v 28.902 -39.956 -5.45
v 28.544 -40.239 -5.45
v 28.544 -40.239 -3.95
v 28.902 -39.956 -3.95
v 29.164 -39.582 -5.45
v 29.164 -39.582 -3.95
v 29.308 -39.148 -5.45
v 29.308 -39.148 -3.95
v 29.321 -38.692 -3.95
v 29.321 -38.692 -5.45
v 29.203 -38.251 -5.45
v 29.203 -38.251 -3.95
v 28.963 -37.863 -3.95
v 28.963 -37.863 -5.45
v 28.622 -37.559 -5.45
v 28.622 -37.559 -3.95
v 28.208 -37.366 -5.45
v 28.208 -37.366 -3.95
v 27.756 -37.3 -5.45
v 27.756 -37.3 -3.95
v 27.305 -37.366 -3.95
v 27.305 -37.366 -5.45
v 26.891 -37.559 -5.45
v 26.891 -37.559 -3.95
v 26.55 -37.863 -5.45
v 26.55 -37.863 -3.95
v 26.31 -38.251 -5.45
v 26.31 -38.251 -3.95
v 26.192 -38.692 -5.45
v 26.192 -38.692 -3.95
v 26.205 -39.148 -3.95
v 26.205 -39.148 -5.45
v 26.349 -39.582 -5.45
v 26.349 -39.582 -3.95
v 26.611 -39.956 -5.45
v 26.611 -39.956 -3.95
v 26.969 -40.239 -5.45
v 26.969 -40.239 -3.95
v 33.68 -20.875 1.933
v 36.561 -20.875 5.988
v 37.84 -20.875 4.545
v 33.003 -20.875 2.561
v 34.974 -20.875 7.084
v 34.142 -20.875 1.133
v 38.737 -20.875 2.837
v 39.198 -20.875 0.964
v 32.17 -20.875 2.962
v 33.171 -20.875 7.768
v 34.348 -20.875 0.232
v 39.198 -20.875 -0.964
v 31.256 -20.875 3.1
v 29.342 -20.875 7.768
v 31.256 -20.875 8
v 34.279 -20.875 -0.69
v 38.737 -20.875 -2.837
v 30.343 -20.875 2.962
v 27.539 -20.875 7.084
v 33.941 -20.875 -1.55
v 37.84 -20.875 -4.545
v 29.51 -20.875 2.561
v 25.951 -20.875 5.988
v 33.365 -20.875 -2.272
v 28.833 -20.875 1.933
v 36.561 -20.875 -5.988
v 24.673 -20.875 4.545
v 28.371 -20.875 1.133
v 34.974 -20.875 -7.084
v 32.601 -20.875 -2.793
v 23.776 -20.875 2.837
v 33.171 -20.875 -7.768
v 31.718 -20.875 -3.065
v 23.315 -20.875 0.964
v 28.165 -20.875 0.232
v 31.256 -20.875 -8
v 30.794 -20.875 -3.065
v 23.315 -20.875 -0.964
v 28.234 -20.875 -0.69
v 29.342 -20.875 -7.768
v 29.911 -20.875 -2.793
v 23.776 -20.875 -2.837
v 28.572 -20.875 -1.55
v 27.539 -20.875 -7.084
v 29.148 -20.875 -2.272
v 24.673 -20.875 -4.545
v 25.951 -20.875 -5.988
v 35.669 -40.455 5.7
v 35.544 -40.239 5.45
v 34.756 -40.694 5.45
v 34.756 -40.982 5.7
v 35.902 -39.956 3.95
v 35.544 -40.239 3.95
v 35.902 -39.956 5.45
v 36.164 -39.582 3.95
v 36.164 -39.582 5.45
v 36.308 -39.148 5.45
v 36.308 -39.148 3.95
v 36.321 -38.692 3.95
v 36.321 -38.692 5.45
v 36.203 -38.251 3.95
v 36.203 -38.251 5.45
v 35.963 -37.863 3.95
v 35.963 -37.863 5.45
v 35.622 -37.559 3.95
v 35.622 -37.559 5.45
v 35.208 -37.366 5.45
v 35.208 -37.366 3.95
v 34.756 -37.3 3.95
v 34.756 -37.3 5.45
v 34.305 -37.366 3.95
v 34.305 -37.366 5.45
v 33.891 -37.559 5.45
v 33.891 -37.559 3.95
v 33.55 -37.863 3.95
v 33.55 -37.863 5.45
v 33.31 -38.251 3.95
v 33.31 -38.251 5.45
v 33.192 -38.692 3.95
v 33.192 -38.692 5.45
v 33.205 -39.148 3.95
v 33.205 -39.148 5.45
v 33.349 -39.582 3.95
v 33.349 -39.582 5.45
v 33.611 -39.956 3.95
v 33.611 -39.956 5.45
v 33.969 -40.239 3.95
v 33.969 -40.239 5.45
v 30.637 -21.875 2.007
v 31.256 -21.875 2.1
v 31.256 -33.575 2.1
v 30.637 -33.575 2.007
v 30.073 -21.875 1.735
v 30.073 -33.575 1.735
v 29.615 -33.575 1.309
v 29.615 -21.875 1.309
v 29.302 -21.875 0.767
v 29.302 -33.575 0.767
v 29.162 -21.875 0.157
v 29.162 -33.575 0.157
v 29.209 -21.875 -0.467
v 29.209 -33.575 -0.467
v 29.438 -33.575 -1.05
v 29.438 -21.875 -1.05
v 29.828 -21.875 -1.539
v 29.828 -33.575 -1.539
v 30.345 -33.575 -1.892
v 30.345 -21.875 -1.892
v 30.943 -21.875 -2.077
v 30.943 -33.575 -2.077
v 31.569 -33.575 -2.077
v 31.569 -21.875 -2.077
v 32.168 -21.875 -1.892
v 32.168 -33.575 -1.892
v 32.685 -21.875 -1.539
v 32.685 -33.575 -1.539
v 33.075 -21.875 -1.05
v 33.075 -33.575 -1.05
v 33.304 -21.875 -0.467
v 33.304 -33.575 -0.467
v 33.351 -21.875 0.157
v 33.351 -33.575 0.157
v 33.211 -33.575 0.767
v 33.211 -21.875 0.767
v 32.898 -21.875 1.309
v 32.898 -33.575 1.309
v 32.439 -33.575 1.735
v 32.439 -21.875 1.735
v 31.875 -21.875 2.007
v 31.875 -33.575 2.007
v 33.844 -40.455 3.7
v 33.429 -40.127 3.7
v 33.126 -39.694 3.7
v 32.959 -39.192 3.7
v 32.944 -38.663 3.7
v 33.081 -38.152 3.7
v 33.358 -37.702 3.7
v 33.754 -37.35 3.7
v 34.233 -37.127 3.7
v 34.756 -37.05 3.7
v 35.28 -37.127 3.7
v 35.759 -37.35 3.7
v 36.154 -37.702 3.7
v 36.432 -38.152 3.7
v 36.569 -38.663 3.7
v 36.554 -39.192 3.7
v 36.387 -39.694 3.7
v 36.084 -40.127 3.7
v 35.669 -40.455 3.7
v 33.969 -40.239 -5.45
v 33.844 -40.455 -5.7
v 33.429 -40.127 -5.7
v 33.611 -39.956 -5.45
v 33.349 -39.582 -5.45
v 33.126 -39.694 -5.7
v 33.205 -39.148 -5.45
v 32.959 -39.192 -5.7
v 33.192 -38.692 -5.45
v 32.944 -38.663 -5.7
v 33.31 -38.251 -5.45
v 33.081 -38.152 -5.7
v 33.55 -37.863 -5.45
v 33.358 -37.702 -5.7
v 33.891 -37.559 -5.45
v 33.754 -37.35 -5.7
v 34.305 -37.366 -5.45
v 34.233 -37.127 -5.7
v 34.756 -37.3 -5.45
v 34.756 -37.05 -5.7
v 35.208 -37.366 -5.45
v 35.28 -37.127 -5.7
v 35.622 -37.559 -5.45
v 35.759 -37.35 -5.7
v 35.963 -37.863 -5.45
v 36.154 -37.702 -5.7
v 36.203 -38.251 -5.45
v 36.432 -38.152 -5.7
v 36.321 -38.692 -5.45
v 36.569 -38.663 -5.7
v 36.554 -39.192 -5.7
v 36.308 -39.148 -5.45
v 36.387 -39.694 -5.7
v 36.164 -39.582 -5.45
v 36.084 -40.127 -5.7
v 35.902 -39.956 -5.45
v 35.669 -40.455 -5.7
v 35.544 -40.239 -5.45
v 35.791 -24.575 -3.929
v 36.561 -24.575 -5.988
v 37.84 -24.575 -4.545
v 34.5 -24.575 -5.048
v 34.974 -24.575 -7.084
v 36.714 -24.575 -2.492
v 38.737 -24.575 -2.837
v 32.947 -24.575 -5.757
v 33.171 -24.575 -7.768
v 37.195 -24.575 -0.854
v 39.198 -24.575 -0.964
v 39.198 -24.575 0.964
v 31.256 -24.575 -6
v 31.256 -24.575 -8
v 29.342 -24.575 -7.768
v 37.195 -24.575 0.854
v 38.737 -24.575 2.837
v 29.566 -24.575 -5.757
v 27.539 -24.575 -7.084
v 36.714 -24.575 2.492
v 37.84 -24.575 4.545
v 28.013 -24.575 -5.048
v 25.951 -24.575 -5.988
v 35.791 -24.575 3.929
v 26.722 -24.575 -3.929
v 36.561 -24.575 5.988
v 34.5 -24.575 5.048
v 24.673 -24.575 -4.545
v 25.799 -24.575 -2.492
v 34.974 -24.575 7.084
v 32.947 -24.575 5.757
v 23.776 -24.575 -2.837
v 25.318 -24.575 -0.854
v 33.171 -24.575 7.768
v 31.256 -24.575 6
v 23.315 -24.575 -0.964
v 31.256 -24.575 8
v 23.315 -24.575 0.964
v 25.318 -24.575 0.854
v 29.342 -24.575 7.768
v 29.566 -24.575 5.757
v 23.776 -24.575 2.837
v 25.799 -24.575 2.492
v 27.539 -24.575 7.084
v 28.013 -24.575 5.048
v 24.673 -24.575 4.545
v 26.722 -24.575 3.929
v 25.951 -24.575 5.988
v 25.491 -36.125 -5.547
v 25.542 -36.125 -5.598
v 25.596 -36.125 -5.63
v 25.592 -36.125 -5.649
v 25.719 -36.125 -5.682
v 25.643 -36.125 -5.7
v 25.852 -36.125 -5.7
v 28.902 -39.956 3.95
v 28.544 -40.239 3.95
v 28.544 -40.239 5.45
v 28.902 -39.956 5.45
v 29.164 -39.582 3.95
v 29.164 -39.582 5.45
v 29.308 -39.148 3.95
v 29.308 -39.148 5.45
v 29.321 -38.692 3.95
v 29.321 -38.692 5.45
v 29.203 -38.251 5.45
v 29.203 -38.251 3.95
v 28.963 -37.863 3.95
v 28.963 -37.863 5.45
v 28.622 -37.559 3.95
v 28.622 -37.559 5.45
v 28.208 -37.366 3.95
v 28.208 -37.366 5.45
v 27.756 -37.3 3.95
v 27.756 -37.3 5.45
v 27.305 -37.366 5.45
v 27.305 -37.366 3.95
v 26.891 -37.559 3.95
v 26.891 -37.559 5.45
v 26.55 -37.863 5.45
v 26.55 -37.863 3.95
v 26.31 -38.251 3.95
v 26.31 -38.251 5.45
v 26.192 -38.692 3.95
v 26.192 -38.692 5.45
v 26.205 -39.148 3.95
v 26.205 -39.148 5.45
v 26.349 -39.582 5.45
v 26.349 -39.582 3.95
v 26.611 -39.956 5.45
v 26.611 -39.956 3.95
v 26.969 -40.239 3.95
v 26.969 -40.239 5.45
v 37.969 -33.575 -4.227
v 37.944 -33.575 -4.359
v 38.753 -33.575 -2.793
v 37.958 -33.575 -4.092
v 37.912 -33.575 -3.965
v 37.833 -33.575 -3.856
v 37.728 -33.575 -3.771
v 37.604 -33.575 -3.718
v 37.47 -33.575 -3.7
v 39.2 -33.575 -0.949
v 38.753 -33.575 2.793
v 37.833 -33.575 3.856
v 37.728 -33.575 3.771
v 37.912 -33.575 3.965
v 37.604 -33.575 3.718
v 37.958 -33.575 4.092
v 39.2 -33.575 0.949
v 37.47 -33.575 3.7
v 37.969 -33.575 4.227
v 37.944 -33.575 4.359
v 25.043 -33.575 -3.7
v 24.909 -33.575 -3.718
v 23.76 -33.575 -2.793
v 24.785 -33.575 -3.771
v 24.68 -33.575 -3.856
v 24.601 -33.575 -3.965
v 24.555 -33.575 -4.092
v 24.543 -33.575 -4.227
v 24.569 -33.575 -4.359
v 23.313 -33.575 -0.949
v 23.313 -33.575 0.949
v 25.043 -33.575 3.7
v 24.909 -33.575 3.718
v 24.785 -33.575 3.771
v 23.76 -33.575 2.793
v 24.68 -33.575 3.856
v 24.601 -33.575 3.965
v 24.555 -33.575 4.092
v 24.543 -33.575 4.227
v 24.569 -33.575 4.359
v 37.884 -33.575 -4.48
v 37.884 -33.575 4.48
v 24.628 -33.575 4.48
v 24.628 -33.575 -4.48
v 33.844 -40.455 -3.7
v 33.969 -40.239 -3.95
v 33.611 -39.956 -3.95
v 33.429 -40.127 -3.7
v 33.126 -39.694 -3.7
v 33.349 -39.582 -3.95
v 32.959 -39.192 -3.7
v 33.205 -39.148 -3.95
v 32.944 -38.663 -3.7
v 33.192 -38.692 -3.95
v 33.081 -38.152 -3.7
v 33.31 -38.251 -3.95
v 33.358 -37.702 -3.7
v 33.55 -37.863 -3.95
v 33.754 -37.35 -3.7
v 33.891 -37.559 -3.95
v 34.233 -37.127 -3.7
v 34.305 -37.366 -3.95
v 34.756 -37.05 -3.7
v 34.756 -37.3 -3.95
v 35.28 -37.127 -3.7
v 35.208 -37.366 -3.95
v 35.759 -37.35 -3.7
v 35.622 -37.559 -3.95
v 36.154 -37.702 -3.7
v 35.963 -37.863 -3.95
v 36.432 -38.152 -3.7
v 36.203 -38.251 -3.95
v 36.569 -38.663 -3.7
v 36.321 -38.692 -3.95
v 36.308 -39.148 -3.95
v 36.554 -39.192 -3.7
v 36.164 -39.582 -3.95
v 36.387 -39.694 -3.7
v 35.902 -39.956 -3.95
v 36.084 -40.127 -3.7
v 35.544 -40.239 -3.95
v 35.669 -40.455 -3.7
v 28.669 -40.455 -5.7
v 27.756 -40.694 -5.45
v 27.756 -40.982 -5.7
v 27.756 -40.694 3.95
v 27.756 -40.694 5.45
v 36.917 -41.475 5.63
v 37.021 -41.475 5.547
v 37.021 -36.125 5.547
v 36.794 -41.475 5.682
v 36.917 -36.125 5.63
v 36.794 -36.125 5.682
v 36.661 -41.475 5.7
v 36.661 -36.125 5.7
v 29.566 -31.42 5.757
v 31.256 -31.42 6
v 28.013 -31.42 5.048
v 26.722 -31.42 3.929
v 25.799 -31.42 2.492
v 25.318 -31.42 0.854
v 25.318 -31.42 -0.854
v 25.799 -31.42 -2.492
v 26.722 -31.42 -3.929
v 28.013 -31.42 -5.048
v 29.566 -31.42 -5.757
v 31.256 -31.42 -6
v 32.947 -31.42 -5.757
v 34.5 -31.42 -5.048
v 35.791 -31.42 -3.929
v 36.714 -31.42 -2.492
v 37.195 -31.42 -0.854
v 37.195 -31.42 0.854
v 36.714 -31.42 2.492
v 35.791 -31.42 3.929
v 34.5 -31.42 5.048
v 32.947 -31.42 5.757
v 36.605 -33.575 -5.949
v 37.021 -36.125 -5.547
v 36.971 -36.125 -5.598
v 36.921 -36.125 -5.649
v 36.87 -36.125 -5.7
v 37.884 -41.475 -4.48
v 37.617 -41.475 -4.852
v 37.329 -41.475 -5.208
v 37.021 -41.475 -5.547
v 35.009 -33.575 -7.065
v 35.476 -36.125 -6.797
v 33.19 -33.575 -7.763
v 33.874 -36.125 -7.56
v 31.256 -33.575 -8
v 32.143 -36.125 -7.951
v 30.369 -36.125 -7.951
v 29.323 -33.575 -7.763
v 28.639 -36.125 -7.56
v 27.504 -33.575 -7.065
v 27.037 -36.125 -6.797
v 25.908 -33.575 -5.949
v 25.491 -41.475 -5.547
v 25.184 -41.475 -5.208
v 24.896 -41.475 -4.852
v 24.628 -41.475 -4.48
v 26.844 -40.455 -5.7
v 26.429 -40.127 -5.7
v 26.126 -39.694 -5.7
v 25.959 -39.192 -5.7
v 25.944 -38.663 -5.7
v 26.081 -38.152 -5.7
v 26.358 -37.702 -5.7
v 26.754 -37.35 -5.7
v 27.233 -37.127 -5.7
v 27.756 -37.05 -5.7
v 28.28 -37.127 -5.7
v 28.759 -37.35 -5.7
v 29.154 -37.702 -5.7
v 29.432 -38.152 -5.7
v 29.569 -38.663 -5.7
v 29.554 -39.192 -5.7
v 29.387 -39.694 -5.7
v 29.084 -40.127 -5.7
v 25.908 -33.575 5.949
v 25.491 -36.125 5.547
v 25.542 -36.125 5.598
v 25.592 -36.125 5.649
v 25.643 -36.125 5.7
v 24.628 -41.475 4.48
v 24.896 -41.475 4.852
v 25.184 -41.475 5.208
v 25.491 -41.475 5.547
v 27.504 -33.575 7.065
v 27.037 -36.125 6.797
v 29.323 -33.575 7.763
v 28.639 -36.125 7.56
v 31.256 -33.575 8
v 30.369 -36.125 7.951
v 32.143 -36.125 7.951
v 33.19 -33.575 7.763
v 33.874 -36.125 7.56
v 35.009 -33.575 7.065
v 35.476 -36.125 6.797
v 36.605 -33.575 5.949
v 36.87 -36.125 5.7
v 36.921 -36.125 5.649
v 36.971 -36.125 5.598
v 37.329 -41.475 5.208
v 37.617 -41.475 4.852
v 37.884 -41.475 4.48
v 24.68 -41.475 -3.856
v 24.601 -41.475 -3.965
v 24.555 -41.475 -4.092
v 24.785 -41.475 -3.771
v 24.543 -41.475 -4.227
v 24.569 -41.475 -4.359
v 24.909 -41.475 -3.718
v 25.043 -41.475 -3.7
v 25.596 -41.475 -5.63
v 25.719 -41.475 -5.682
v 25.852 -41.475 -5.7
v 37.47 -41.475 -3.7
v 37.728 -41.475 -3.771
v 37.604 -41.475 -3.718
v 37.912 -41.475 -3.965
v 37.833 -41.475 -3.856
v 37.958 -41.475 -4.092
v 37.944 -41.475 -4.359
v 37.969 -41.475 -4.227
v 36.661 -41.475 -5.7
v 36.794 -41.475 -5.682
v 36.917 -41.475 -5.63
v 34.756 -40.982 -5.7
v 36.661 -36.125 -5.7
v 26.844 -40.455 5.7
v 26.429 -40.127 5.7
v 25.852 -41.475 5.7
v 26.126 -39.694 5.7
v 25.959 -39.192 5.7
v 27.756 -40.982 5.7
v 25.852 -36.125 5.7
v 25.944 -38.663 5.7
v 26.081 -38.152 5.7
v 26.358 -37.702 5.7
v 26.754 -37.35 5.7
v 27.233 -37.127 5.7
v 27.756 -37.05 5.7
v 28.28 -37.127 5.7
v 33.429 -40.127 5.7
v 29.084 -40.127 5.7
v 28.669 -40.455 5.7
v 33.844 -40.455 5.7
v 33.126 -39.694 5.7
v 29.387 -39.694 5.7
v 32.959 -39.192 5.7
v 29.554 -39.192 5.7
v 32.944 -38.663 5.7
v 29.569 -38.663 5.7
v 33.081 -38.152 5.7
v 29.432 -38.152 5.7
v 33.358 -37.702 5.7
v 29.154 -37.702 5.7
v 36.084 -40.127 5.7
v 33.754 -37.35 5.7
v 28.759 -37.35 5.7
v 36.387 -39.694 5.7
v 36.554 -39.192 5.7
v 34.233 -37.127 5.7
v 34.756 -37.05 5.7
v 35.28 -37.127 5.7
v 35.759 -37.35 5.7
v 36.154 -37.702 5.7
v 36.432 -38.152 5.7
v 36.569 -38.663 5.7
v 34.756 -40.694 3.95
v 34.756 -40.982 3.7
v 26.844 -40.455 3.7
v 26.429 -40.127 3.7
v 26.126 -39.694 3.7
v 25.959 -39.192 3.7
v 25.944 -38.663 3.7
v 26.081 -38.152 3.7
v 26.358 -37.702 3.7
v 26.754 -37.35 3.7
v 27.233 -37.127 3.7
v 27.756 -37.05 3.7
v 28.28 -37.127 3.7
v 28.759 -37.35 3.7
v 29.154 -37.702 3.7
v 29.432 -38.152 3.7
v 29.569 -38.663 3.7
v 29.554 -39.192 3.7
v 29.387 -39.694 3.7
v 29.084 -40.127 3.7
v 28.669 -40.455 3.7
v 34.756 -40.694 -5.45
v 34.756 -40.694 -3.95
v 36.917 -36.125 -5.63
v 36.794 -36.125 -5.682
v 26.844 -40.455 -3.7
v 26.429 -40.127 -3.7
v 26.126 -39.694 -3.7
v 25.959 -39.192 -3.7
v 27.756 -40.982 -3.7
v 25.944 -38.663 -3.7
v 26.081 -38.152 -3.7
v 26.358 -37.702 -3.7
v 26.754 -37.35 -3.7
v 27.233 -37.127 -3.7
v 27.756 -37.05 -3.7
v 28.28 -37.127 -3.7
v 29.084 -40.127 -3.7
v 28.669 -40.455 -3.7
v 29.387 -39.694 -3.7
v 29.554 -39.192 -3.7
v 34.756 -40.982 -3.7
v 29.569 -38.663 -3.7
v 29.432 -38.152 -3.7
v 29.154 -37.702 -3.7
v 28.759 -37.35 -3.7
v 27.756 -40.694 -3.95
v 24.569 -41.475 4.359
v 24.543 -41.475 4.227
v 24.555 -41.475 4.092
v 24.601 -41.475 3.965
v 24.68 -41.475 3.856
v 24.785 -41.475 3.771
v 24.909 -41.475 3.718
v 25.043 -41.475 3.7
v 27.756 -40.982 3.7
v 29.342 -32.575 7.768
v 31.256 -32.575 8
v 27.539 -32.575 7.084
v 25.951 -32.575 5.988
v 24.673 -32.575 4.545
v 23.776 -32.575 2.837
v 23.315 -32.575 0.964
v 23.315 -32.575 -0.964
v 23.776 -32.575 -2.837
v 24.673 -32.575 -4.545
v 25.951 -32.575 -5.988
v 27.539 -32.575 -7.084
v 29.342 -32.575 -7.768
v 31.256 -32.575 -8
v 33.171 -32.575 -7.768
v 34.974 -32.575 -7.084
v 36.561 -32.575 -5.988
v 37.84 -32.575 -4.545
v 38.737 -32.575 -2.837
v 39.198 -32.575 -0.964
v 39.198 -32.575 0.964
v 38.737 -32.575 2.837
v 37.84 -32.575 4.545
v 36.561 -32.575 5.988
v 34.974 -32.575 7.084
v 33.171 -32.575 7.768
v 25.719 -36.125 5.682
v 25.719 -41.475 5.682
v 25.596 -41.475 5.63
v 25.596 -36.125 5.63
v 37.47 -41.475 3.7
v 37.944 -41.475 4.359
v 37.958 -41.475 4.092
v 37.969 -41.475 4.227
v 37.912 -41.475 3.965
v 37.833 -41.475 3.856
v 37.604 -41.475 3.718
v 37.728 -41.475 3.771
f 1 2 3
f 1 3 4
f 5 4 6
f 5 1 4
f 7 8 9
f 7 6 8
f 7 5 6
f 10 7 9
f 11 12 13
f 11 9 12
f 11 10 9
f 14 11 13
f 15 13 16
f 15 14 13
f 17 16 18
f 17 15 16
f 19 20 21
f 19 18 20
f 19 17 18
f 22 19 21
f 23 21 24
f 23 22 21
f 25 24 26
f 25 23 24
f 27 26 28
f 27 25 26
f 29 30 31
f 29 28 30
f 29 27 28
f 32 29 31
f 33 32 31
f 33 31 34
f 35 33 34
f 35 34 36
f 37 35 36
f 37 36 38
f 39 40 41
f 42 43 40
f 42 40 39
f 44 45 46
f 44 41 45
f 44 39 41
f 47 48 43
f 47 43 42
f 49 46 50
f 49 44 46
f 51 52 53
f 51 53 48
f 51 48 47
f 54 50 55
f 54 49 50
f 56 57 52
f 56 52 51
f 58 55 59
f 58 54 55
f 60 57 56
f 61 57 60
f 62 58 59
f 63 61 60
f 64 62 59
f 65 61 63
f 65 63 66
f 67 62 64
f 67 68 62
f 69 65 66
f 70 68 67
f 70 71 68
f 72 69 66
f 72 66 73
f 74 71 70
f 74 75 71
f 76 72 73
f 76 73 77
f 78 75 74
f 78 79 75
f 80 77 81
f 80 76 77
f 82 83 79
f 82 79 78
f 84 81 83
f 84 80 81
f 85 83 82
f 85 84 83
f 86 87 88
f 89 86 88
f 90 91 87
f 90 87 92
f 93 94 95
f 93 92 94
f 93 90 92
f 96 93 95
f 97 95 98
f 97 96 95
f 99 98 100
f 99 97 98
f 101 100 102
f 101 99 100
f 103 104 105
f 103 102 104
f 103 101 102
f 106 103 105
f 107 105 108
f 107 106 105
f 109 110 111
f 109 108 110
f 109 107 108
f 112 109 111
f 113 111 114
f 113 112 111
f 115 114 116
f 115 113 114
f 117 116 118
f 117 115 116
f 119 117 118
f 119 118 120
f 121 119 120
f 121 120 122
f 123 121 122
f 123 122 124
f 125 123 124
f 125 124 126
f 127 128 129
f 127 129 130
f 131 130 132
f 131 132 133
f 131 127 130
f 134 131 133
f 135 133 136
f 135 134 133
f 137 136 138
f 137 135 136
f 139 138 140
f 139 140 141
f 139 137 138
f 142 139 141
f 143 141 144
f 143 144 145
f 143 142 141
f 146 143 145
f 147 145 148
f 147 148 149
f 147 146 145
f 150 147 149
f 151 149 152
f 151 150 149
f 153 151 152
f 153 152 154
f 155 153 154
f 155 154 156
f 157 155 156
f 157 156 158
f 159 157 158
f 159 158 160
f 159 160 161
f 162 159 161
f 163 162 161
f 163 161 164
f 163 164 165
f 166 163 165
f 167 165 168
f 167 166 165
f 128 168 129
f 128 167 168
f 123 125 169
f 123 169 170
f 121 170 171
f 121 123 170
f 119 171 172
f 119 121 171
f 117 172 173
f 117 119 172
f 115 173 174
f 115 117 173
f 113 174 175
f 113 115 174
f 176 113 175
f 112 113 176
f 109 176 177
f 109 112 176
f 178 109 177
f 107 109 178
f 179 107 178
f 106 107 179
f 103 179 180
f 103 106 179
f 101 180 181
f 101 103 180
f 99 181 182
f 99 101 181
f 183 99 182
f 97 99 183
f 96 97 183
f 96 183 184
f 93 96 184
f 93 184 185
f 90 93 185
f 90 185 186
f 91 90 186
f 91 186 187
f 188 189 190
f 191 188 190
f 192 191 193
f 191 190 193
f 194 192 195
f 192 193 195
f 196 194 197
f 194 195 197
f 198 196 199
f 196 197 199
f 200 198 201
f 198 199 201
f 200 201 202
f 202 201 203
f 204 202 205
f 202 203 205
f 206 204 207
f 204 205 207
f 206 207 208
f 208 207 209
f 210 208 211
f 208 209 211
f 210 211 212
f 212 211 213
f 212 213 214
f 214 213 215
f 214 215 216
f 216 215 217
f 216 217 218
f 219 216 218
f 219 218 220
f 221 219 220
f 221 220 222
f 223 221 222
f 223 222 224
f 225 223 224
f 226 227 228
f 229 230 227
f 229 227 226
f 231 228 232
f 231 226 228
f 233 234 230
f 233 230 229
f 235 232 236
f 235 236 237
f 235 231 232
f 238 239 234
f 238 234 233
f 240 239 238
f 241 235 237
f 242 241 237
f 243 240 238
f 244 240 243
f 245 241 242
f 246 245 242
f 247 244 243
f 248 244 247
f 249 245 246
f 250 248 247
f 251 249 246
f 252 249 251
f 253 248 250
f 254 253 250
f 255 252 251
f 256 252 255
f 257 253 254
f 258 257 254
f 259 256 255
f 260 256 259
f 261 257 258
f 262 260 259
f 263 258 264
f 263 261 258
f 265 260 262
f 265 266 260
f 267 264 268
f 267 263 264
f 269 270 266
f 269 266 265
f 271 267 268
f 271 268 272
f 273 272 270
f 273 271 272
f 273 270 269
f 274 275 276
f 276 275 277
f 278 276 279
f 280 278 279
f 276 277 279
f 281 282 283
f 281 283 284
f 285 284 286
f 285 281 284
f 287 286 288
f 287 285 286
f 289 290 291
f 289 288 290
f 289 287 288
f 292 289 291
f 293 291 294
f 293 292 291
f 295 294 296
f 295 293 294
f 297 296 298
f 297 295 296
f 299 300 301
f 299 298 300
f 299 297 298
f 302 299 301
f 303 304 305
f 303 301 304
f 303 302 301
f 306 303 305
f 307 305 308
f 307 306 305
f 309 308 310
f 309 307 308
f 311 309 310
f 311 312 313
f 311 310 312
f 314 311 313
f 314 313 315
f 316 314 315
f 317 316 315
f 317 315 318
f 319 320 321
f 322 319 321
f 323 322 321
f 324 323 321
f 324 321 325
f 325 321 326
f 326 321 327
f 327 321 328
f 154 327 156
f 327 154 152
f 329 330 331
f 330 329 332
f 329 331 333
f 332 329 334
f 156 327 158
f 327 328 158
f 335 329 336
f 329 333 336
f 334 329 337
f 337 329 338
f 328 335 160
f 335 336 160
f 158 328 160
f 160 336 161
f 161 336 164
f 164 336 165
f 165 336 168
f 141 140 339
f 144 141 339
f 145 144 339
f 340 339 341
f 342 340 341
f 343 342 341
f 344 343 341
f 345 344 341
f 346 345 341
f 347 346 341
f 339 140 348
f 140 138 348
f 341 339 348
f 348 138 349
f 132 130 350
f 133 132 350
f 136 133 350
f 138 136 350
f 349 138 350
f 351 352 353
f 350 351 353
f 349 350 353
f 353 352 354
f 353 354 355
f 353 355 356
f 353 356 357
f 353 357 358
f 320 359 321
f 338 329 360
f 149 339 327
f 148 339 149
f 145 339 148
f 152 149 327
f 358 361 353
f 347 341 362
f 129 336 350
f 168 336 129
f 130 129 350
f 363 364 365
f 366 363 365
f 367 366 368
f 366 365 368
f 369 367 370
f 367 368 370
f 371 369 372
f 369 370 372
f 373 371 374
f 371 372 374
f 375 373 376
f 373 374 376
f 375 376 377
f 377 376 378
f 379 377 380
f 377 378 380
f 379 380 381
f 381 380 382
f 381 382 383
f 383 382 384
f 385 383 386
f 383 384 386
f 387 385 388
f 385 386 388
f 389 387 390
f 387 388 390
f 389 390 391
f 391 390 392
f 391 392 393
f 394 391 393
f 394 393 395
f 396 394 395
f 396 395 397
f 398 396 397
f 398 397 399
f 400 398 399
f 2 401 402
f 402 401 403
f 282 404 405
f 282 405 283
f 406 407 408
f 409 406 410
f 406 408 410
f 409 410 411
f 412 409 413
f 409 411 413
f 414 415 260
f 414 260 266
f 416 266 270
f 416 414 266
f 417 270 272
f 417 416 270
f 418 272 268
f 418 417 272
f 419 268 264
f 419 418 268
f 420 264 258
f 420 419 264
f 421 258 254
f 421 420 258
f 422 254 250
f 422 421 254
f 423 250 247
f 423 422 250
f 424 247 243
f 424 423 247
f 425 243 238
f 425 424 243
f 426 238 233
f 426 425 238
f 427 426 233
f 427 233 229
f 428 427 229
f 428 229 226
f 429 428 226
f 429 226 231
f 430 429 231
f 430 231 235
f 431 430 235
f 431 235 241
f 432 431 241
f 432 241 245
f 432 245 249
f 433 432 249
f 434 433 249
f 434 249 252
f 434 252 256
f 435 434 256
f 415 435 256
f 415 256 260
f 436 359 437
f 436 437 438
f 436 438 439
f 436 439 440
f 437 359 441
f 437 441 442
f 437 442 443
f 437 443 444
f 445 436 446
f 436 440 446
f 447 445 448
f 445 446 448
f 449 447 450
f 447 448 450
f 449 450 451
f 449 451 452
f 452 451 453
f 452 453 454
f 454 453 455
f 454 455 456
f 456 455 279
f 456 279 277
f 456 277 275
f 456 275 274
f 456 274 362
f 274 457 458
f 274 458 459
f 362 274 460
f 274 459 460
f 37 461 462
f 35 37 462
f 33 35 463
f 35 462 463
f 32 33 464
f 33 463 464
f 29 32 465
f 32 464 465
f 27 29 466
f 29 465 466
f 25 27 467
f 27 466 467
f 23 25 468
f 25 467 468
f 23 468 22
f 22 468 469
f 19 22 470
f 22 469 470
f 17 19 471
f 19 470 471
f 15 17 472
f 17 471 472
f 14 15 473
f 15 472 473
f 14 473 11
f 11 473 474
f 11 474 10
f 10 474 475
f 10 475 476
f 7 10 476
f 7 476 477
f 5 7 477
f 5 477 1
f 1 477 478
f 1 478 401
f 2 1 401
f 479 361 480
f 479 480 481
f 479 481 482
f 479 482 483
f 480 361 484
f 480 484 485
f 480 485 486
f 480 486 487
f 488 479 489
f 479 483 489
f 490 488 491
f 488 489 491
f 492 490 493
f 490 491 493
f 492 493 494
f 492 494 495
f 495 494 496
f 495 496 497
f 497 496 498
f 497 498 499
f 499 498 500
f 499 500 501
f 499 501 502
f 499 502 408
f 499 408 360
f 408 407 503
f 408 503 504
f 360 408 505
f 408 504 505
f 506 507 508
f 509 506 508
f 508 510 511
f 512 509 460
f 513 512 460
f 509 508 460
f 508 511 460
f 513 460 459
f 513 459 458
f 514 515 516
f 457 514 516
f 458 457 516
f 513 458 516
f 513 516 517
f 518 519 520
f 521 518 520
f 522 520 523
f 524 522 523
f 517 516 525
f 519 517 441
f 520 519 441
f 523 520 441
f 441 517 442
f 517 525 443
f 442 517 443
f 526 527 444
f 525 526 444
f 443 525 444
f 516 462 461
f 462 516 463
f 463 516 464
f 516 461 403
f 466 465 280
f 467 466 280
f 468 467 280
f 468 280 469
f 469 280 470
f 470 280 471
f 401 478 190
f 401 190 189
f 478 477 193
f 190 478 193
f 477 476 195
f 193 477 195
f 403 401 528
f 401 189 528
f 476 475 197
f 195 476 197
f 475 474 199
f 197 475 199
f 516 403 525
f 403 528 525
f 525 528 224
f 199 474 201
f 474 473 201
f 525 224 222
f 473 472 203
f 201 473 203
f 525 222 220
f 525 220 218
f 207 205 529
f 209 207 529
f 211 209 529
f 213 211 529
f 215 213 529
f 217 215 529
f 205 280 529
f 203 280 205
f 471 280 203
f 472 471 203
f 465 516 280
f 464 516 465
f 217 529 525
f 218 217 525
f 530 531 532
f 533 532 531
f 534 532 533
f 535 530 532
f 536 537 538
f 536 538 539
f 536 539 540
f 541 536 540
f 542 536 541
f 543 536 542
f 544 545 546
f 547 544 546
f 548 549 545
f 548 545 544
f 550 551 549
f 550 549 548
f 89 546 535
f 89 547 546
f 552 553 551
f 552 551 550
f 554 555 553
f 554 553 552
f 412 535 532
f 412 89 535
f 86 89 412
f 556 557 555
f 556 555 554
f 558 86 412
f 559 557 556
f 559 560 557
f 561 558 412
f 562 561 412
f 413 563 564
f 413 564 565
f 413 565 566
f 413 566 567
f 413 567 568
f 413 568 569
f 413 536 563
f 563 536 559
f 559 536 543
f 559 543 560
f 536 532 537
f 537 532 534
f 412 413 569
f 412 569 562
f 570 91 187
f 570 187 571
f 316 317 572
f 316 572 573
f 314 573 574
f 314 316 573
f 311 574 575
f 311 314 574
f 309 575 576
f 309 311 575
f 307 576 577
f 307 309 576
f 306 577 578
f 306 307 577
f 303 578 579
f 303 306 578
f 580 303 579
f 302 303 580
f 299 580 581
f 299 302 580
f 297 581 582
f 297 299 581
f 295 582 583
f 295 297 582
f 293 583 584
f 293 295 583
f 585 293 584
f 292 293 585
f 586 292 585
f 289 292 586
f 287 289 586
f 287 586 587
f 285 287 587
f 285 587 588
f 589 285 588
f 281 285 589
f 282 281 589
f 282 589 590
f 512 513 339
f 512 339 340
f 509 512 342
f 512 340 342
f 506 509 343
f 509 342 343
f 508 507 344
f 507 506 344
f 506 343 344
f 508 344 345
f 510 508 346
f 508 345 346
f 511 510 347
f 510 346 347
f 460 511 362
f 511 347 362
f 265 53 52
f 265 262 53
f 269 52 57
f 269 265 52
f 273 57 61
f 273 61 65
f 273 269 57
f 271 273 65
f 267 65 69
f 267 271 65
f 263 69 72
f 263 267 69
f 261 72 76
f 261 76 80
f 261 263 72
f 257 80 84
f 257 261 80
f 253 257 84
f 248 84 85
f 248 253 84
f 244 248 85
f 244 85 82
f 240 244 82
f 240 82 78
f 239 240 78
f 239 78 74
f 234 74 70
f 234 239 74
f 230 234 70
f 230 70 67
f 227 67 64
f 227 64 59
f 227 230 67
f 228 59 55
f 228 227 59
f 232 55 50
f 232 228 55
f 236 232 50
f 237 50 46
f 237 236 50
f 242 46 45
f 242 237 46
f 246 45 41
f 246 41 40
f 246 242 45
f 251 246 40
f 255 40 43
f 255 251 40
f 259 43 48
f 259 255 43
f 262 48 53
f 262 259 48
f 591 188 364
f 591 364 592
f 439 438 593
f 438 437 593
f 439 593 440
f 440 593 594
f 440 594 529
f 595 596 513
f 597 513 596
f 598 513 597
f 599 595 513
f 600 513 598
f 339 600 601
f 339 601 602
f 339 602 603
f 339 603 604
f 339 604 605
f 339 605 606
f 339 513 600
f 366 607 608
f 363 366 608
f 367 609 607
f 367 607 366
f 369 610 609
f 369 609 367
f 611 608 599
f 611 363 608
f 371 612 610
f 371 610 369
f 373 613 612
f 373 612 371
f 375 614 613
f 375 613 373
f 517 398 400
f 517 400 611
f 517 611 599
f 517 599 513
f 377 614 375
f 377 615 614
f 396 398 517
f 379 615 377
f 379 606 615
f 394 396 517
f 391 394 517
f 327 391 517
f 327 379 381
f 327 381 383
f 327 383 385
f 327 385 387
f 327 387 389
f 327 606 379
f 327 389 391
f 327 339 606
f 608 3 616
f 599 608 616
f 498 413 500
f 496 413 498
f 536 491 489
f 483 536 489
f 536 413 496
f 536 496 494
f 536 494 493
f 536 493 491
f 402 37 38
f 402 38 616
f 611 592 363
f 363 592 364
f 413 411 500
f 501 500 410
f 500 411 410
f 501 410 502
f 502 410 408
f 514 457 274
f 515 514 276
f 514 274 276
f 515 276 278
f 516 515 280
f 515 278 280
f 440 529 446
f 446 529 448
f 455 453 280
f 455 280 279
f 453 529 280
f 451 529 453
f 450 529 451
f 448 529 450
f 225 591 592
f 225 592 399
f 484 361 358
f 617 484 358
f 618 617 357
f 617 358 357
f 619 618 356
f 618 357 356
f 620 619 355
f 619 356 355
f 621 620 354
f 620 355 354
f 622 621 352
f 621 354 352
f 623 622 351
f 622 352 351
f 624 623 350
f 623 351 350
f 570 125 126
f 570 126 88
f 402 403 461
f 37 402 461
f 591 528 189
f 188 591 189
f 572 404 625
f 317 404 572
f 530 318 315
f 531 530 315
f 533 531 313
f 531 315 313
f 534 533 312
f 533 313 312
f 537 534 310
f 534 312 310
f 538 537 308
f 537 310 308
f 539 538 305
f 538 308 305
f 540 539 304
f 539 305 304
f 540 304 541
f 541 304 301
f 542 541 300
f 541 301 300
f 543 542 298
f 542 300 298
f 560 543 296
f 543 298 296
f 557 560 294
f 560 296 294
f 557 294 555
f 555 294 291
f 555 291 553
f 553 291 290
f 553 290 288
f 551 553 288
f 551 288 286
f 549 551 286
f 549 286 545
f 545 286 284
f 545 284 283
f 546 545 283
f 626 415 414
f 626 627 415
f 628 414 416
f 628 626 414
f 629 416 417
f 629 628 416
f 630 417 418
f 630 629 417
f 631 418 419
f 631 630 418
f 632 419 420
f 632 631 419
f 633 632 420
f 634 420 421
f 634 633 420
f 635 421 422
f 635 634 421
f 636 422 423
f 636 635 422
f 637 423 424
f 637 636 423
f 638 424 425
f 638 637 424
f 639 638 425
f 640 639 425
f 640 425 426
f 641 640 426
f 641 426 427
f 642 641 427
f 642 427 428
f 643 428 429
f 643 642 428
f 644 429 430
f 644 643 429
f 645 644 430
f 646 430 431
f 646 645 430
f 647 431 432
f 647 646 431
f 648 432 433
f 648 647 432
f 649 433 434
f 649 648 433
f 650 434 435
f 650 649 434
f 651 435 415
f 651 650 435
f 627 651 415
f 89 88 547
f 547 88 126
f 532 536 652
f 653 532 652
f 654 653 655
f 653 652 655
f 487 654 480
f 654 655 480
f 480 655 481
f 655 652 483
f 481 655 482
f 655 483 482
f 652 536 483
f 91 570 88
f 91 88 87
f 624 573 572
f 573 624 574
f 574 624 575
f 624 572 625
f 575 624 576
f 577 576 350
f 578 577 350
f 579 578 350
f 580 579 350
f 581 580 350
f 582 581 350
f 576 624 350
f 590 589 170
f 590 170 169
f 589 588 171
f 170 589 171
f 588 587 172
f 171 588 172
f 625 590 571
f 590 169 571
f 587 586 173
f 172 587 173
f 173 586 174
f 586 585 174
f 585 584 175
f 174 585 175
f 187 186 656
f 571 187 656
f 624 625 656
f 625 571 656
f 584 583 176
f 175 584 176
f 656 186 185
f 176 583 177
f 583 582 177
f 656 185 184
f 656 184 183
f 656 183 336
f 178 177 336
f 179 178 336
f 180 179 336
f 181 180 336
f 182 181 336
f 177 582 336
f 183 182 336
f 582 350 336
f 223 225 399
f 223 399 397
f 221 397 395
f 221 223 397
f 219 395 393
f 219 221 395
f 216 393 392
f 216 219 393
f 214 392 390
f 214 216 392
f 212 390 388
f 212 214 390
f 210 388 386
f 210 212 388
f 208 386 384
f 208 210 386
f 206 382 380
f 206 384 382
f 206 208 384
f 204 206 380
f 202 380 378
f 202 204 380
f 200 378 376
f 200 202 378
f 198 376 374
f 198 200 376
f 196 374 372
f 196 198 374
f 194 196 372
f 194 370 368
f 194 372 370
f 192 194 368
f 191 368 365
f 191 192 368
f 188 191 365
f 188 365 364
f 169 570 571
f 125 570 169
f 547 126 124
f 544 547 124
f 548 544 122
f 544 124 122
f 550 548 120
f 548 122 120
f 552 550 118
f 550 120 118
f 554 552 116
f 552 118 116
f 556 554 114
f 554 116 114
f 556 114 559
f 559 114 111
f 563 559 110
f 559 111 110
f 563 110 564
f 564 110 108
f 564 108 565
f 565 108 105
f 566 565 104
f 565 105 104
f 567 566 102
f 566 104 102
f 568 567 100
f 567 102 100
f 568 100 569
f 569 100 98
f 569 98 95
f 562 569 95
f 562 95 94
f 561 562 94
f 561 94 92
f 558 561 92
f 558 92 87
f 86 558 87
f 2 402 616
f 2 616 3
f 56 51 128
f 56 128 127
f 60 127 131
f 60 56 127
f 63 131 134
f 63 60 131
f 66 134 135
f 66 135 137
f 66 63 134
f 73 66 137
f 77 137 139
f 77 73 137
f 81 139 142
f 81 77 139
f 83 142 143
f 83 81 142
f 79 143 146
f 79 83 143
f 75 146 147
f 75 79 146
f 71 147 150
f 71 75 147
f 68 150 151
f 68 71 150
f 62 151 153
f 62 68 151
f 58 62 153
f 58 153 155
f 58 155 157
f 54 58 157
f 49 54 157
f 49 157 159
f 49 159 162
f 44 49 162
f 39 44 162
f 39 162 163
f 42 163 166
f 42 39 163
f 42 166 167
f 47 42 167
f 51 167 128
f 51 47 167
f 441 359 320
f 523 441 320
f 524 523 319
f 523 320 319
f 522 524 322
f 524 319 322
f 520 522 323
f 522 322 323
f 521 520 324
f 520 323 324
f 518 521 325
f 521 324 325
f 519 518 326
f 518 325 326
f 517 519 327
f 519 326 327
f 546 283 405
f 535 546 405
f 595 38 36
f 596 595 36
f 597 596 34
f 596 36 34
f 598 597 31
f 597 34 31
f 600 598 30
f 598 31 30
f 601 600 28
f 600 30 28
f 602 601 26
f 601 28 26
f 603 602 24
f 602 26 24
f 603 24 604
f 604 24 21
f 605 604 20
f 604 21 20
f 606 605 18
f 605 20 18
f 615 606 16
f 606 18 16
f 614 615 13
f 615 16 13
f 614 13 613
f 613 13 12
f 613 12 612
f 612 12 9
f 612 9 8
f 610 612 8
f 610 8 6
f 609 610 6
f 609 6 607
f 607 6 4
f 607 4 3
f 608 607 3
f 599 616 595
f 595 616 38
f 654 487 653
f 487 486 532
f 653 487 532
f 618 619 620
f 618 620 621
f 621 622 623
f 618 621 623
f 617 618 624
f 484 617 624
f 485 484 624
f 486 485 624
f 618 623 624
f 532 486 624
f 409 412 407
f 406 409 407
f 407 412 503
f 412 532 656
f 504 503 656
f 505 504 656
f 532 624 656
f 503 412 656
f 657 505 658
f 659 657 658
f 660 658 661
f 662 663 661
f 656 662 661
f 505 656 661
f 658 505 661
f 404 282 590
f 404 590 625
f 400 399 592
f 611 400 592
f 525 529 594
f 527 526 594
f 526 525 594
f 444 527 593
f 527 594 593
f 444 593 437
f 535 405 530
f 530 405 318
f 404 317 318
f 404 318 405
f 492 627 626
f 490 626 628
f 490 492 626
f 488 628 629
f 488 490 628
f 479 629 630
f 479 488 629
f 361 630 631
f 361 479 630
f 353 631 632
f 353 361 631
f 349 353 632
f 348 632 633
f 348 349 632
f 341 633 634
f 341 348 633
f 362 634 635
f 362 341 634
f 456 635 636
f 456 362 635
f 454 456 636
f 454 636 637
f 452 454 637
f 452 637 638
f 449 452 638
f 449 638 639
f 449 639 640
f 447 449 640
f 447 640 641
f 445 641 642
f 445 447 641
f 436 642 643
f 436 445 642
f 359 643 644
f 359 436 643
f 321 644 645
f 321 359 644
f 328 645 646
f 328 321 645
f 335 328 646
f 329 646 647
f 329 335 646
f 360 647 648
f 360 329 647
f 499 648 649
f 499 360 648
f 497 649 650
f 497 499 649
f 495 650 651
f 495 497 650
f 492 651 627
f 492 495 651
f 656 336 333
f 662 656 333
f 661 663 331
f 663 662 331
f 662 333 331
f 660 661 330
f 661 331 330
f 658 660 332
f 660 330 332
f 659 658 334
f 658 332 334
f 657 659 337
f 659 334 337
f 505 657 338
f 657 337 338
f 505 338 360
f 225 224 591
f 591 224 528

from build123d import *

# Parameters (mm, degrees)
CHAMFER1_SIZE           = 3.464101615
CHAMFER1_SIZE_2         = 2
CHAMFER3_SIZE           = 1
BOSS_EXTRUDE1_START     = -41.474989169
BOSS_EXTRUDE1_OUTLINE_R = 8
BOSS_EXTRUDE1_DEPTH     = 7.9
SKETCH1_4_R             = 1.5749999999999995
CUT_EXTRUDE1_DEPTH      = 3.7
CUT_EXTRUDE3_DEPTH      = 58.66491382432064
CUT_EXTRUDE3_DEPTH_BACK = 58.66491382432064
SKETCH1_6_R             = 1.5749999999999995
CUT_EXTRUDE2_START      = -5.7
CUT_EXTRUDE2_DEPTH      = 52.964913909989384
FILLET2_R               = 0.5
CHAMFER4_SIZE           = 0.25


# Read off the part's stored shape, not the designer's step: Boss-Extrude1
with BuildPart() as part:
    # Sketch1 → Revolve1 (revolve)
    with BuildSketch(Plane.XY, mode=Mode.PRIVATE) as revolve1_sk:
        Polygon((33.35643335515833, -33.57498916935771), (33.35643335515833, -20.874989169357704), (39.256433355158336, -20.87498916935769), (39.256433355158336, -24.574989169357693), (37.25643335515833, -24.574989169357696), (37.256433355158336, -30.5749891693577), (39.256433355158336, -30.5749891693577), (39.256433355158336, -33.5749891693577), align=None)
    revolve(revolve1_sk.sketch.rotate(Axis((31.256433355158332, 2.6543833262093552, 0), (0, -1, 0)), 90), axis=Axis((31.256433355158332, 2.6543833262093552, 0), (0, -1, 0)))

    # Chamfer1
    # the kernel refuses this chamfer: 3.464101615, 2 mm, written as the material it takes off along each edge
    with BuildSketch(Plane(origin=(31.256433355158332, -30.5749891693577, 0), x_dir=(0, 0, 1), z_dir=(1, 0, 0))) as chamfer1_piece_1_section:
        Polygon((8.000000000000004 - CHAMFER1_SIZE, 0), (8.000000000000004, CHAMFER1_SIZE_2), (8.000000000000004, 0), align=None)
    chamfer1_piece_1 = revolve(axis=Axis((31.256433355158332, -30.5749891693577, 0), (0, -1, 0)), mode=Mode.PRIVATE)
    chamfer1_piece_1 = chamfer1_piece_1 - Plane(origin=(31.256433355158332, -31.987048934544962, 0), x_dir=(0, 0, 1), z_dir=(0, -1, 0)) * Cylinder(5.9999999999999964, 33, mode=Mode.PRIVATE)
    add(chamfer1_piece_1, mode=Mode.SUBTRACT)

    # Chamfer3
    chamfer3_edges = [part.edges().sort_by_distance(p)[0] for p in [
        (31.256433355158332, -20.874989169357704, -2.099999999999998),
    ]]
    chamfer(chamfer3_edges, length=CHAMFER3_SIZE)

    # Boss-Extrude1 outline → Boss-Extrude1 (add)
    with BuildSketch(Plane(origin=(0, 0, 0), x_dir=(1, 0, 0), z_dir=(0, 1, 0)).offset(BOSS_EXTRUDE1_START)):
        with Locations((31.256433355, 0)):
            Circle(BOSS_EXTRUDE1_OUTLINE_R)
    extrude(amount=BOSS_EXTRUDE1_DEPTH)

    # Sketch1<4> → Cut-Extrude1 (cut, symmetric)
    # profile 1 of 7: a face of its own
    with BuildSketch(Plane.XY):
        Polygon((39.25643335515834, -41.47498916935769), (39.25643335515834, -36.1249891693577), (23.256433355158325, -36.12498916935768), (23.256433355158325, -41.47498916935769), align=None)
        with BuildLine():
            Line((27.75643335515833, -40.69364251730501), (26.968933355158327, -40.23897918031817))
            ThreePointArc((26.968933355158327, -40.23897918031817), (26.96893335515834, -37.51099915839719), (29.331433355158335, -38.87498916935768))
            ThreePointArc((29.331433355158335, -38.87498916935768), (29.120423366118825, -39.662489169357684), (28.543933355158334, -40.238979180318175))
            Line((28.543933355158334, -40.238979180318175), (27.75643335515833, -40.69364251730501))
        make_face(mode=Mode.SUBTRACT)
        with BuildLine():
            Line((34.75643335515833, -40.69364251730501), (33.968933355158335, -40.238979180318175))
            ThreePointArc((33.968933355158335, -40.238979180318175), (33.96893335515833, -37.5109991583972), (36.33143335515833, -38.87498916935768))
            ThreePointArc((36.33143335515833, -38.87498916935768), (36.12042336611882, -39.662489169357684), (35.54393335515832, -40.238979180318175))
            Line((35.54393335515833, -40.23897918031818), (34.75643335515833, -40.69364251730501))
        make_face(mode=Mode.SUBTRACT)
    # profile 2 of 7: a face of its own
    with BuildSketch(Plane.XY):
        with Locations((27.756433355158336, -38.87498916935768)):
            Circle(SKETCH1_4_R)
    # profile 3 of 7: a face of its own
    with BuildSketch(Plane.XY):
        with Locations((34.75643335515833, -38.87498916935768)):
            Circle(SKETCH1_4_R)
    # profile 4 of 7: a face of its own
    with BuildSketch(Plane.XY):
        with BuildLine():
            ThreePointArc((35.54393335515832, -40.238979180318175), (34.75643335515833, -40.449989169357686), (33.968933355158335, -40.238979180318175))
            Line((33.968933355158335, -40.238979180318175), (34.75643335515833, -40.69364251730501))
            Line((34.75643335515833, -40.69364251730501), (35.54393335515833, -40.23897918031818))
        make_face()
    # profile 5 of 7: a face of its own
    with BuildSketch(Plane.XY):
        with BuildLine():
            ThreePointArc((28.543933355158334, -40.238979180318175), (27.75643335515833, -40.449989169357686), (26.968933355158327, -40.23897918031817))
            Line((26.968933355158327, -40.23897918031817), (27.75643335515833, -40.69364251730501))
            Line((27.75643335515833, -40.69364251730501), (28.543933355158334, -40.238979180318175))
        make_face()
    # profile 6 of 7: a face of its own
    with BuildSketch(Plane.XY):
        Polygon((33.35643335515833, -33.57498916935771), (23.256433355158332, -33.5749891693577), (23.256433355158325, -35.87498916935769), (39.25643335515834, -35.87498916935769), (39.256433355158336, -33.5749891693577), align=None)
    # profile 7 of 7: a face of its own
    with BuildSketch(Plane.XY):
        Polygon((39.25643335515834, -36.1249891693577), (39.25643335515834, -35.87498916935769), (23.256433355158325, -35.87498916935769), (23.256433355158325, -36.12498916935768), align=None)
    extrude(amount=CUT_EXTRUDE1_DEPTH, both=True, mode=Mode.SUBTRACT)

    # Sketch1<6> → Cut-Extrude3 (cut, two sides: drawn at the far end of the back side and taken through both)
    with BuildSketch(Plane.XY.offset(-CUT_EXTRUDE3_DEPTH_BACK)):
        with Locations((27.756433355158336, -38.87498916935768)):
            Circle(SKETCH1_6_R)
        with BuildLine():
            ThreePointArc((28.543933355158334, -40.238979180318175), (27.75643335515833, -40.449989169357686), (26.968933355158327, -40.23897918031817))
            Line((26.968933355158327, -40.23897918031817), (27.75643335515833, -40.69364251730501))
            Line((27.75643335515833, -40.69364251730501), (28.543933355158334, -40.238979180318175))
        make_face()
        with BuildLine():
            ThreePointArc((35.54393335515832, -40.238979180318175), (34.75643335515833, -40.449989169357686), (33.968933355158335, -40.238979180318175))
            Line((33.968933355158335, -40.238979180318175), (34.75643335515833, -40.69364251730501))
            Line((34.75643335515833, -40.69364251730501), (35.54393335515833, -40.23897918031818))
        make_face()
        with Locations((34.75643335515833, -38.87498916935768)):
            Circle(SKETCH1_6_R)
    extrude(amount=CUT_EXTRUDE3_DEPTH + CUT_EXTRUDE3_DEPTH_BACK, mode=Mode.SUBTRACT)

    # Sketch1<5> → Cut-Extrude2 (cut, through all)
    with BuildSketch(Plane.XY.offset(CUT_EXTRUDE2_START)):
        Polygon((39.25643335515834, -41.47498916935769), (39.25643335515834, -36.1249891693577), (23.256433355158325, -36.12498916935768), (23.256433355158325, -41.47498916935769), align=None)
        with BuildLine():
            Line((27.75643335515833, -40.69364251730501), (26.968933355158327, -40.23897918031817))
            ThreePointArc((26.968933355158327, -40.23897918031817), (26.96893335515834, -37.51099915839719), (29.331433355158335, -38.87498916935768))
            ThreePointArc((29.331433355158335, -38.87498916935768), (29.120423366118825, -39.662489169357684), (28.543933355158334, -40.238979180318175))
            Line((28.543933355158334, -40.238979180318175), (27.75643335515833, -40.69364251730501))
        make_face(mode=Mode.SUBTRACT)
        with BuildLine():
            Line((34.75643335515833, -40.69364251730501), (33.968933355158335, -40.238979180318175))
            ThreePointArc((33.968933355158335, -40.238979180318175), (33.96893335515833, -37.5109991583972), (36.33143335515833, -38.87498916935768))
            ThreePointArc((36.33143335515833, -38.87498916935768), (36.12042336611882, -39.662489169357684), (35.54393335515832, -40.238979180318175))
            Line((35.54393335515833, -40.23897918031818), (34.75643335515833, -40.69364251730501))
        make_face(mode=Mode.SUBTRACT)
    cut_extrude2 = extrude(amount=-CUT_EXTRUDE2_DEPTH, mode=Mode.SUBTRACT)

    # Mirror2: Cut-Extrude2 across plane
    add(cut_extrude2.mirror(Plane.XY), mode=Mode.SUBTRACT)

    # Fillet2
    # the kernel refuses this fillet: 0.5 mm, written as the material it takes off along each edge
    with BuildSketch(Plane(origin=(36.86981023527447, -36.1249891693577, -5.7), x_dir=(0.7029804888308749, 0, 0.7112091340267671), z_dir=(0, -1, 0))) as fillet2_piece_1:
        with BuildLine():
            CenterArc((0.2088579287890988, 0.4999546060201171), FILLET2_R, 224.66662086027418, 46.10544623611554)
            Line((-0.14674663822282122, 0.14846436160319898), (0, 0))
            ThreePointArc((0, 0), (0.10779764066534617, -0.00072630367813129), (0.21559528133068703, -1e-17))
        make_face()
    extrude(amount=5.888988203147861, mode=Mode.SUBTRACT)
    with BuildSketch(Plane(origin=(25.643056474725523, -36.12498916935768, -5.7), x_dir=(-0.702980488830873, 0, 0.7112091340267691), z_dir=(0, -1, 0))) as fillet2_piece_2:
        with BuildLine():
            CenterArc((0.20885792878910586, -0.49995460602011715), FILLET2_R, 89.22793290361042, 46.10544623611679)
            Line((-0.14674663822282266, -0.14846436160320758), (0, 0))
            ThreePointArc((0, 0), (0.10779764066534558, 0.00072630367812718), (0.21559528133069272, 1e-17))
        make_face()
    extrude(amount=5.888988203147889, mode=Mode.SUBTRACT)
    with BuildSketch(Plane(origin=(25.643056474725523, -36.12498916935768, 5.7), x_dir=(1, 0, 0), z_dir=(0, -1, 0))) as fillet2_piece_3:
        with BuildLine():
            CenterArc((0.20874923352183217, -0.5), FILLET2_R, 90, 46.10544623635468)
            ThreePointArc((-0.15155927626154408, -0.1533333333334701), (-0.07629619193971493, -0.07615608935305396), (0, 0))
            Line((0, 0), (0.20874923352183217, 0))
        make_face()
    extrude(amount=5.888988203147981, mode=Mode.SUBTRACT)
    with BuildSketch(Plane(origin=(36.86981023527447, -36.1249891693577, 5.7), x_dir=(-1, 0, 0), z_dir=(0, -1, 0))) as fillet2_piece_4:
        with BuildLine():
            CenterArc((0.2087492335218215, 0.5), FILLET2_R, 223.8945537636461, 46.10544623635394)
            ThreePointArc((-0.1515592762615512, 0.15333333333346388), (-0.07629619193971138, 0.07615608935304952), (0, 0))
            Line((0, 0), (0.2087492335218215, 0))
        make_face()
    extrude(amount=5.888988203147967, mode=Mode.SUBTRACT)
    with BuildSketch(Plane(origin=(38.34938760552213, -33.5749891693577, 3.7), x_dir=(-1, 0, 0), z_dir=(0, -1, 0))) as fillet2_piece_5:
        with BuildLine():
            CenterArc((0.8792596973597355, -0.5), FILLET2_R, 90, 124.05579774256802)
            ThreePointArc((0.4650133938155747, -0.780000000000002), (0.22143035578866233, -0.3966033935575206), (0, 0))
            Line((0, 0), (0.8792596973597355, 0))
        make_face()
    extrude(amount=10.170238776398236, mode=Mode.SUBTRACT)
    with BuildSketch(Plane(origin=(24.163479104477865, -33.5749891693577, 3.7), x_dir=(1, 0, 0), z_dir=(0, -1, 0))) as fillet2_piece_6:
        with BuildLine():
            CenterArc((0.8792596973597426, 0.5), FILLET2_R, 145.94420225743224, 124.05579774256776)
            ThreePointArc((0.4650133938155818, 0.7799999999999994), (0.22143035578866233, 0.3966033935575153), (0, 0))
            Line((0, 0), (0.8792596973597426, 0))
        make_face()
    extrude(amount=10.170238776398243, mode=Mode.SUBTRACT)
    with BuildSketch(Plane(origin=(38.34938760552213, -33.5749891693577, -3.7), x_dir=(-0.512075424194691, 0, -0.858940486841683), z_dir=(0, -1, 0))) as fillet2_piece_7:
        with BuildLine():
            CenterArc((0.8797175259236281, -0.4991940404131022), FILLET2_R, 86.74637410845834, 124.05579774256779)
            Line((0.4502472825027866, -0.7552317525104477), (0, 0))
            ThreePointArc((0, 0), (0.4540477553154187, 0.01289535339037927), (0.9080955106308399, 1e-17))
        make_face()
    extrude(amount=10.170238776398243, mode=Mode.SUBTRACT)
    with BuildSketch(Plane(origin=(24.163479104477865, -33.5749891693577, -3.7), x_dir=(0.512075424194691, 0, -0.858940486841683), z_dir=(0, -1, 0))) as fillet2_piece_8:
        with BuildLine():
            CenterArc((0.8797175259236281, 0.4991940404131022), FILLET2_R, 149.1978281489743, 124.05579774256734)
            Line((0.4502472825027848, 0.7552317525104447), (0, 0))
            ThreePointArc((0, 0), (0.4540477553154179, -0.01289535339037882), (0.9080955106308399, -1e-17))
        make_face()
    extrude(amount=10.170238776398243, mode=Mode.SUBTRACT)

    # Chamfer4
    chamfer4_edges = [part.edges().sort_by_distance(p)[0] for p in [
        (34.36268335515833, -40.46631084881159, -3.7),
        (34.75643335515833, -37.29998916935768, -3.7),
        (27.75643335515833, -37.29998916935768, -5.7),
        (27.362683355158328, -40.46631084881159, -5.7),
        (34.75643335515834, -37.299989169357694, -5.7),
        (34.36268335515833, -40.46631084881159, -5.7),
        (28.150183355158333, -40.46631084881159, -5.7),
        (35.15018335515833, -40.466310848811595, -5.7),
        (34.75643335515834, -37.2999891693577, 5.7),
        (34.36268335515833, -40.46631084881159, 5.7),
        (35.15018335515833, -40.466310848811595, 5.7),
        (27.75643335515833, -37.29998916935768, 5.7),
        (27.362683355158328, -40.46631084881159, 5.7),
        (28.150183355158333, -40.46631084881159, 5.7),
        (34.75643335515833, -37.29998916935768, 3.7),
        (34.36268335515833, -40.46631084881159, 3.7),
        (35.15018335515833, -40.4663108488116, 3.7000000000000006),
        (27.362683355158328, -40.46631084881159, 3.7),
        (28.15018335515833, -40.46631084881159, 3.7),
        (27.75643335515834, -37.29998916935768, 3.7),
        (27.75643335515834, -37.29998916935768, -3.7),
        (28.15018335515833, -40.46631084881159, -3.7),
        (27.362683355158328, -40.46631084881159, -3.7),
        (35.15018335515833, -40.4663108488116, -3.7000000000000006),
    ]]
    chamfer(chamfer4_edges, length=CHAMFER4_SIZE)


solid = part.part
